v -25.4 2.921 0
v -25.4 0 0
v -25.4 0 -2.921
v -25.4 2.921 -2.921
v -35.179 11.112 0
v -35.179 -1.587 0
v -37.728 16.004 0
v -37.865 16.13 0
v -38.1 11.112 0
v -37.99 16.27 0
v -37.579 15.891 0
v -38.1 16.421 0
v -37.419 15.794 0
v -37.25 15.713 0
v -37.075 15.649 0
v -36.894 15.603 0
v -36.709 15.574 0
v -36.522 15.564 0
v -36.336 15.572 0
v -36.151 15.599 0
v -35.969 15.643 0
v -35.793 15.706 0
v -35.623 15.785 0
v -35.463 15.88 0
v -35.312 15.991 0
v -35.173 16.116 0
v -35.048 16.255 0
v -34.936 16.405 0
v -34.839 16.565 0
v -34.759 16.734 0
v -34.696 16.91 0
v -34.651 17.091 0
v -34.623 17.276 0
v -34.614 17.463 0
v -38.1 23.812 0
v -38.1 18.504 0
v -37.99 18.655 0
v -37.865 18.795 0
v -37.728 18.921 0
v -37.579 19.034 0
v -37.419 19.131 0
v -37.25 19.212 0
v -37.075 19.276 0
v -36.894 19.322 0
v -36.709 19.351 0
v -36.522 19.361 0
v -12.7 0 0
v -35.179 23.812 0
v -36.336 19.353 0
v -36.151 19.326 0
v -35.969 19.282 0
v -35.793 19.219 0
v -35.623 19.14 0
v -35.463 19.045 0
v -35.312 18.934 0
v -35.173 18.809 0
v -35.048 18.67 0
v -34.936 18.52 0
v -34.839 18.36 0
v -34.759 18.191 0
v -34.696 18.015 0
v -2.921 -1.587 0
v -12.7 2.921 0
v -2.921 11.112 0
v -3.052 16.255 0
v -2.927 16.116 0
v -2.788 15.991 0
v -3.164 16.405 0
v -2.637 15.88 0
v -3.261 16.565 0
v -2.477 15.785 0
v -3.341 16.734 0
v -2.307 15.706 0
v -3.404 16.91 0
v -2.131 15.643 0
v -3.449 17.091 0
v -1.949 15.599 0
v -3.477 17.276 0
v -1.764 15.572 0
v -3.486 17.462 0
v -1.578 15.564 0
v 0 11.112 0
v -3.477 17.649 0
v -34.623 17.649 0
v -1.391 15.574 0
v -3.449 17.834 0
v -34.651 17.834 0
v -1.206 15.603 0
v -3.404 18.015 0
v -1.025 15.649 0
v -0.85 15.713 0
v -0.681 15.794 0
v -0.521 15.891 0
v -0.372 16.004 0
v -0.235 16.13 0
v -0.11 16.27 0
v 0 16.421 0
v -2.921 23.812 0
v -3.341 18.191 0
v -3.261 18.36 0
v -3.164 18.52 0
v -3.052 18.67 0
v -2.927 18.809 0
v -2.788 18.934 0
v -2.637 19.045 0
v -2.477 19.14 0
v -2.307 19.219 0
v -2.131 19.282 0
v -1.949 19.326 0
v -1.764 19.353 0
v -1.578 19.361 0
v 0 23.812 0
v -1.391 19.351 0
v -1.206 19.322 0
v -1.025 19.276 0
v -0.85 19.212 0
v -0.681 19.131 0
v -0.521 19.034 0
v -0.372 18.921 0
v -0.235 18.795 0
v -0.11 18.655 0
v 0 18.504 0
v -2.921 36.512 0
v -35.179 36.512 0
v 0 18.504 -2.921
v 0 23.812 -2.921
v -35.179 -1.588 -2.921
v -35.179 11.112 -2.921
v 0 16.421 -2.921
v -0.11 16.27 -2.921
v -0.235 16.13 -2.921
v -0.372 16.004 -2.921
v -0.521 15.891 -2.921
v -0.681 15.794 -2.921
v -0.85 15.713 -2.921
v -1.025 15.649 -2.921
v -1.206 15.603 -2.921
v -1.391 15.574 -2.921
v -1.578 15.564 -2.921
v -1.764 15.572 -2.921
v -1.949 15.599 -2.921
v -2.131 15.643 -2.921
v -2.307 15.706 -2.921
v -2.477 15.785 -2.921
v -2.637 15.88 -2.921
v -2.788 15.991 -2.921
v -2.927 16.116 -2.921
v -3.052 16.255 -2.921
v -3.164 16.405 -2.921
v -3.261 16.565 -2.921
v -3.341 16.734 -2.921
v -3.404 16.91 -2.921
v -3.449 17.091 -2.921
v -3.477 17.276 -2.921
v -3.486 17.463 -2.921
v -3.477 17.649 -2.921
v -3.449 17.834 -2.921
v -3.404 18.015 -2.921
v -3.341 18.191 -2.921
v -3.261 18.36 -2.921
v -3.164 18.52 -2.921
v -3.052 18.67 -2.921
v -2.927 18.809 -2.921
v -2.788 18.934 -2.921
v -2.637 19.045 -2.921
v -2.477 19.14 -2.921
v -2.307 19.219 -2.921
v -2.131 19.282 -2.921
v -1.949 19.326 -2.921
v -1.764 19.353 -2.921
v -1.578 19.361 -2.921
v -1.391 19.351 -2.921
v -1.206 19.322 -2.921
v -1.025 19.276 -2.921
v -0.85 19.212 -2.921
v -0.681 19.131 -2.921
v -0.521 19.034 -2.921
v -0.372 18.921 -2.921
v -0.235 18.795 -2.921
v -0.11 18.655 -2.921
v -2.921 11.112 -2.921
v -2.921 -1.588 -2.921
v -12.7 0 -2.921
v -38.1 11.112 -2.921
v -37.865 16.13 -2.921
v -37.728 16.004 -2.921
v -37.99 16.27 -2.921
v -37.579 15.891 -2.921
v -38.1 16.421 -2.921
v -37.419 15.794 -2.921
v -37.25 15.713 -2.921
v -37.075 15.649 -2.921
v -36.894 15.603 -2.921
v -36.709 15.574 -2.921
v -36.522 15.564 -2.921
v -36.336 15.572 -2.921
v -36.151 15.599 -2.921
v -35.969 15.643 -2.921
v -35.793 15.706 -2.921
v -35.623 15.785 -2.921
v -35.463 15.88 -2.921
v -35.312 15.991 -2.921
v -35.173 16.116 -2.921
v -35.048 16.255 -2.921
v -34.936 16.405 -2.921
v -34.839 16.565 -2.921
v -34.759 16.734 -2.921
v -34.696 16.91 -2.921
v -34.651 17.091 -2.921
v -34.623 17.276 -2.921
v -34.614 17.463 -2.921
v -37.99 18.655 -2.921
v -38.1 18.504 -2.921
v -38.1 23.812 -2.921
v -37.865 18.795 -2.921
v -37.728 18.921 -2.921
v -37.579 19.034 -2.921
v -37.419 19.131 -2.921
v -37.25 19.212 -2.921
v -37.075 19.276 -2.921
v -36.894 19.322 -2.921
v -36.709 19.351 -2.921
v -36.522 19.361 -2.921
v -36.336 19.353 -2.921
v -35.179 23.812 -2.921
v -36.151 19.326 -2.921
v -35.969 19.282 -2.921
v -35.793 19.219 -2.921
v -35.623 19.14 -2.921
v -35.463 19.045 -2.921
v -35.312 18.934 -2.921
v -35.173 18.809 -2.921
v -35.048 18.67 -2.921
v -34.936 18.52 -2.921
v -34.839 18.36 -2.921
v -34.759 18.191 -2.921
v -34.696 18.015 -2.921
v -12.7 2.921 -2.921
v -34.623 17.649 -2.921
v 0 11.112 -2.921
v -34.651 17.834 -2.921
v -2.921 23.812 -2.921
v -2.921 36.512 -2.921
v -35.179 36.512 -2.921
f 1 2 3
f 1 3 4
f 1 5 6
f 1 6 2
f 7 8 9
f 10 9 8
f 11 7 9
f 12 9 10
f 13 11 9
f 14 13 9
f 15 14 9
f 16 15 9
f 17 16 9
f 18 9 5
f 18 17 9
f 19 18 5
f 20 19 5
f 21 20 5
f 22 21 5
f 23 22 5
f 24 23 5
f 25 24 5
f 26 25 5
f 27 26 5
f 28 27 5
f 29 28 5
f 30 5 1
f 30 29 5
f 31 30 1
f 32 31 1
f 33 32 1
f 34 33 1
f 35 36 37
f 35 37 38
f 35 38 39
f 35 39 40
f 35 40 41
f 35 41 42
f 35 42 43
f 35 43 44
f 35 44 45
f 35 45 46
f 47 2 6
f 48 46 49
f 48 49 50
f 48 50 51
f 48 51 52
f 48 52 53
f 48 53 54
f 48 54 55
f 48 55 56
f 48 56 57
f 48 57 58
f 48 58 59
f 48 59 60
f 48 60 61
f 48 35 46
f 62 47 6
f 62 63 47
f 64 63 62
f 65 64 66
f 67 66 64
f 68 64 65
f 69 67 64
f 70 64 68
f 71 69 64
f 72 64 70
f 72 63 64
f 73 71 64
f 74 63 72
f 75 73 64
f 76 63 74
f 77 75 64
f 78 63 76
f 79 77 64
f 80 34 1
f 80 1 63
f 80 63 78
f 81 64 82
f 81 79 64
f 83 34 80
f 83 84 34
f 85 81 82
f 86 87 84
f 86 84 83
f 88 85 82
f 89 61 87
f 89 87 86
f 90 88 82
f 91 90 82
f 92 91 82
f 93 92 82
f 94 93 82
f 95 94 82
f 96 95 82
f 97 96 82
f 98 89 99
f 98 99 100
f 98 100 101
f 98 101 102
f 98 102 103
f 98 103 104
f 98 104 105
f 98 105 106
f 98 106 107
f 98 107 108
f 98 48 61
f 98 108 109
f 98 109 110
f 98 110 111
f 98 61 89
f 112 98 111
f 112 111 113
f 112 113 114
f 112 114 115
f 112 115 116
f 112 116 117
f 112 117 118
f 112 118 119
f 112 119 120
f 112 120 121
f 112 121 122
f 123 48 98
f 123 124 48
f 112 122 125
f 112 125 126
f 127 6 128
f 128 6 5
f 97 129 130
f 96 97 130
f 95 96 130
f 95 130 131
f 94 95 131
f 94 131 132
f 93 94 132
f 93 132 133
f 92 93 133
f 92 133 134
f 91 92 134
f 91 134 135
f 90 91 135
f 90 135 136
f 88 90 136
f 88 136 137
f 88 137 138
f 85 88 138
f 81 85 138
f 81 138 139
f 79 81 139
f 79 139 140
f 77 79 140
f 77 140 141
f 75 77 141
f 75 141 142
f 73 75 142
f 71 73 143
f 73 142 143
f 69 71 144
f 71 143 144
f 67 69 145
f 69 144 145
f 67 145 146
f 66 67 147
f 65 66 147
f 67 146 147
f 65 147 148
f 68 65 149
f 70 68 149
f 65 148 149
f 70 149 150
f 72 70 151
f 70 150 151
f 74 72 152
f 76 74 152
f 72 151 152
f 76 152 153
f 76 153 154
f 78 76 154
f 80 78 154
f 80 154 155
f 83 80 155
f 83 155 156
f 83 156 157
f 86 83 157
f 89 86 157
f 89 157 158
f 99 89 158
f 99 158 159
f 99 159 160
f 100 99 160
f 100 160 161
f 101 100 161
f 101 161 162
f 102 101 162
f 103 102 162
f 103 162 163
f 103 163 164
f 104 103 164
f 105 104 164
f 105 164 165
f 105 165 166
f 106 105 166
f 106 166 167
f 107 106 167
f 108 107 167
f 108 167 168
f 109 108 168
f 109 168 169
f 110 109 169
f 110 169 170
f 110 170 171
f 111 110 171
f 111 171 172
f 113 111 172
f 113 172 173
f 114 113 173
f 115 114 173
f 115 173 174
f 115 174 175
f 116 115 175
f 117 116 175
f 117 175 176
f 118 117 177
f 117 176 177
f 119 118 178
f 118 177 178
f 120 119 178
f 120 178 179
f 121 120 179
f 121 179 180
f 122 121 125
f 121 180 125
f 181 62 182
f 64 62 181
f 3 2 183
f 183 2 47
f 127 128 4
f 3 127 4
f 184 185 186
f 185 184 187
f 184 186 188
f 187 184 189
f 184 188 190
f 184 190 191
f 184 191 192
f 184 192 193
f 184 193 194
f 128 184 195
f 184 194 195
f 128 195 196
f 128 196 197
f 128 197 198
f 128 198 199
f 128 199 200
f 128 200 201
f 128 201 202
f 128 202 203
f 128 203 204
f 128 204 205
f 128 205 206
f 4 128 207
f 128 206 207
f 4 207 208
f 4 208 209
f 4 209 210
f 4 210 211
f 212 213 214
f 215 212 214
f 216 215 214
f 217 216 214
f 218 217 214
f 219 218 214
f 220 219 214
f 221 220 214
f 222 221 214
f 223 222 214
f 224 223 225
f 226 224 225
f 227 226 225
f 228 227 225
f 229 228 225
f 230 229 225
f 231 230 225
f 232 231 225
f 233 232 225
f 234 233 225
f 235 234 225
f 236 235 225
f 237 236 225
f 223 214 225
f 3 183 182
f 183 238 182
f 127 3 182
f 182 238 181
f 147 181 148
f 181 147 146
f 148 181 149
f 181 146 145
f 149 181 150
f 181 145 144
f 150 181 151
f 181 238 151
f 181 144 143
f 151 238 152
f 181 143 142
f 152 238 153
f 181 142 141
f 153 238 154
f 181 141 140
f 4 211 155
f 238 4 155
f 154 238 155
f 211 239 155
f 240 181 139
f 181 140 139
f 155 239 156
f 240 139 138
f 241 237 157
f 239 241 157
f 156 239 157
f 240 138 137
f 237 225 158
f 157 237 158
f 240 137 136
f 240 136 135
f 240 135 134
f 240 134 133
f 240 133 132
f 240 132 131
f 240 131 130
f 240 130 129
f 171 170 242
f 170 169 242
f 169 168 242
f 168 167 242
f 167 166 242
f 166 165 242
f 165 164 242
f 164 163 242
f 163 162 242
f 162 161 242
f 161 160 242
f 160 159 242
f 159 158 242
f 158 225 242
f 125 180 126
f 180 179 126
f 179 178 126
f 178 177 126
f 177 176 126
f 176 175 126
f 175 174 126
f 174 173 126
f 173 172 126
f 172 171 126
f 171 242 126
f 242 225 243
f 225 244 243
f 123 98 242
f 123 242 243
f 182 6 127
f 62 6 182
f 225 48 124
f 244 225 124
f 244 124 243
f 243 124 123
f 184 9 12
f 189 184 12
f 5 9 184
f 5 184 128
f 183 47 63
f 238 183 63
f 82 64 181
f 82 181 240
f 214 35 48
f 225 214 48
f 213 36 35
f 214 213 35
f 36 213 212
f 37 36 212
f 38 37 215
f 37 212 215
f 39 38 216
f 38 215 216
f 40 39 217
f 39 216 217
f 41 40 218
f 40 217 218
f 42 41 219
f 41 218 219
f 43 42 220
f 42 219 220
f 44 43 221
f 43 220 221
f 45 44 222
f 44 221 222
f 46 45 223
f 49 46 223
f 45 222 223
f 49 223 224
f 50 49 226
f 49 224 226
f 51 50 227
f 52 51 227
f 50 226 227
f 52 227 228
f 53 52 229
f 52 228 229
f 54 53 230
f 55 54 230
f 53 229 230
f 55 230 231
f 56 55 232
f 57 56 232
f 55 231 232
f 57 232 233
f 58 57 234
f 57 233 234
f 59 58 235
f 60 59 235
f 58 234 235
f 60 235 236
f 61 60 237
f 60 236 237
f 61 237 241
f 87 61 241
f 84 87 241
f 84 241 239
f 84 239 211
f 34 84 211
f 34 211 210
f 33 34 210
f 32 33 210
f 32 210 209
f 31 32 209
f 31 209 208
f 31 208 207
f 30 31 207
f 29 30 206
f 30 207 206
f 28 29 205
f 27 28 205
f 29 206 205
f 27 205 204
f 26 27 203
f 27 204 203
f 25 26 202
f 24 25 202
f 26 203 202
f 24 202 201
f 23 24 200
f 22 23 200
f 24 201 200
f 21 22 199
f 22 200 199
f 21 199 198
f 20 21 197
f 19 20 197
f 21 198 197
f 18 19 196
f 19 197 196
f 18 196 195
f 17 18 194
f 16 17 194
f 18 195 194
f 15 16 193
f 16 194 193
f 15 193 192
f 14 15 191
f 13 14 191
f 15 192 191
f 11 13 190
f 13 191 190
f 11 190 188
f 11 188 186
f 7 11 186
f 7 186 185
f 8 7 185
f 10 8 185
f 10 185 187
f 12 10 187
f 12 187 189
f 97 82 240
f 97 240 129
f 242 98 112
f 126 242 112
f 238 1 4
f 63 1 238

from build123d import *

# Parameters (mm, degrees)
SKETCH1_W             = 38.1
SKETCH1_H             = 38.1
BOSS_EXTRUDE1_DEPTH   = 2.921
SKETCH2_W             = 12.7
SKETCH2_H             = 2.921
CUT_EXTRUDE1_DEPTH    = 53.851725584
SKETCH3_W             = 2.921
SKETCH3_H             = 12.7
CUT_EXTRUDE2_DEPTH    = 53.851725584
F_6_CLEARANCE_HOLE2_D = 3.7973


with BuildPart() as part:
    # Sketch1 → Boss-Extrude1 (new body)
    with BuildSketch(Plane.XY):
        with Locations((-19.05, 17.4625)):
            Rectangle(SKETCH1_W, SKETCH1_H)
    extrude(amount=-BOSS_EXTRUDE1_DEPTH)

    # Sketch2 → Cut-Extrude1 (cut, through all)
    with BuildSketch(Plane.XY):
        with Locations((-19.05, 1.4605)):
            Rectangle(SKETCH2_W, SKETCH2_H)
    extrude(amount=-CUT_EXTRUDE1_DEPTH, mode=Mode.SUBTRACT)

    # Sketch3 → Cut-Extrude2 (cut, through all)
    with BuildSketch(Plane.XY):
        with Locations((-1.4605, 4.7625)):
            Rectangle(SKETCH3_W, SKETCH3_H)
        with Locations((-1.4605, 30.1625)):
            Rectangle(SKETCH3_W, SKETCH3_H)
        with Locations((-36.6395, 30.1625)):
            Rectangle(SKETCH3_W, SKETCH3_H)
        with Locations((-36.6395, 4.7625)):
            Rectangle(SKETCH3_W, SKETCH3_H)
    extrude(amount=-CUT_EXTRUDE2_DEPTH, mode=Mode.SUBTRACT)

    # #6 Clearance Hole2 (through all)
    with Locations(Plane.XY):
        with Locations((-1.5875, 17.4625), (-36.5125, 17.4625)):
            Hole(F_6_CLEARANCE_HOLE2_D / 2)


solid = part.part
